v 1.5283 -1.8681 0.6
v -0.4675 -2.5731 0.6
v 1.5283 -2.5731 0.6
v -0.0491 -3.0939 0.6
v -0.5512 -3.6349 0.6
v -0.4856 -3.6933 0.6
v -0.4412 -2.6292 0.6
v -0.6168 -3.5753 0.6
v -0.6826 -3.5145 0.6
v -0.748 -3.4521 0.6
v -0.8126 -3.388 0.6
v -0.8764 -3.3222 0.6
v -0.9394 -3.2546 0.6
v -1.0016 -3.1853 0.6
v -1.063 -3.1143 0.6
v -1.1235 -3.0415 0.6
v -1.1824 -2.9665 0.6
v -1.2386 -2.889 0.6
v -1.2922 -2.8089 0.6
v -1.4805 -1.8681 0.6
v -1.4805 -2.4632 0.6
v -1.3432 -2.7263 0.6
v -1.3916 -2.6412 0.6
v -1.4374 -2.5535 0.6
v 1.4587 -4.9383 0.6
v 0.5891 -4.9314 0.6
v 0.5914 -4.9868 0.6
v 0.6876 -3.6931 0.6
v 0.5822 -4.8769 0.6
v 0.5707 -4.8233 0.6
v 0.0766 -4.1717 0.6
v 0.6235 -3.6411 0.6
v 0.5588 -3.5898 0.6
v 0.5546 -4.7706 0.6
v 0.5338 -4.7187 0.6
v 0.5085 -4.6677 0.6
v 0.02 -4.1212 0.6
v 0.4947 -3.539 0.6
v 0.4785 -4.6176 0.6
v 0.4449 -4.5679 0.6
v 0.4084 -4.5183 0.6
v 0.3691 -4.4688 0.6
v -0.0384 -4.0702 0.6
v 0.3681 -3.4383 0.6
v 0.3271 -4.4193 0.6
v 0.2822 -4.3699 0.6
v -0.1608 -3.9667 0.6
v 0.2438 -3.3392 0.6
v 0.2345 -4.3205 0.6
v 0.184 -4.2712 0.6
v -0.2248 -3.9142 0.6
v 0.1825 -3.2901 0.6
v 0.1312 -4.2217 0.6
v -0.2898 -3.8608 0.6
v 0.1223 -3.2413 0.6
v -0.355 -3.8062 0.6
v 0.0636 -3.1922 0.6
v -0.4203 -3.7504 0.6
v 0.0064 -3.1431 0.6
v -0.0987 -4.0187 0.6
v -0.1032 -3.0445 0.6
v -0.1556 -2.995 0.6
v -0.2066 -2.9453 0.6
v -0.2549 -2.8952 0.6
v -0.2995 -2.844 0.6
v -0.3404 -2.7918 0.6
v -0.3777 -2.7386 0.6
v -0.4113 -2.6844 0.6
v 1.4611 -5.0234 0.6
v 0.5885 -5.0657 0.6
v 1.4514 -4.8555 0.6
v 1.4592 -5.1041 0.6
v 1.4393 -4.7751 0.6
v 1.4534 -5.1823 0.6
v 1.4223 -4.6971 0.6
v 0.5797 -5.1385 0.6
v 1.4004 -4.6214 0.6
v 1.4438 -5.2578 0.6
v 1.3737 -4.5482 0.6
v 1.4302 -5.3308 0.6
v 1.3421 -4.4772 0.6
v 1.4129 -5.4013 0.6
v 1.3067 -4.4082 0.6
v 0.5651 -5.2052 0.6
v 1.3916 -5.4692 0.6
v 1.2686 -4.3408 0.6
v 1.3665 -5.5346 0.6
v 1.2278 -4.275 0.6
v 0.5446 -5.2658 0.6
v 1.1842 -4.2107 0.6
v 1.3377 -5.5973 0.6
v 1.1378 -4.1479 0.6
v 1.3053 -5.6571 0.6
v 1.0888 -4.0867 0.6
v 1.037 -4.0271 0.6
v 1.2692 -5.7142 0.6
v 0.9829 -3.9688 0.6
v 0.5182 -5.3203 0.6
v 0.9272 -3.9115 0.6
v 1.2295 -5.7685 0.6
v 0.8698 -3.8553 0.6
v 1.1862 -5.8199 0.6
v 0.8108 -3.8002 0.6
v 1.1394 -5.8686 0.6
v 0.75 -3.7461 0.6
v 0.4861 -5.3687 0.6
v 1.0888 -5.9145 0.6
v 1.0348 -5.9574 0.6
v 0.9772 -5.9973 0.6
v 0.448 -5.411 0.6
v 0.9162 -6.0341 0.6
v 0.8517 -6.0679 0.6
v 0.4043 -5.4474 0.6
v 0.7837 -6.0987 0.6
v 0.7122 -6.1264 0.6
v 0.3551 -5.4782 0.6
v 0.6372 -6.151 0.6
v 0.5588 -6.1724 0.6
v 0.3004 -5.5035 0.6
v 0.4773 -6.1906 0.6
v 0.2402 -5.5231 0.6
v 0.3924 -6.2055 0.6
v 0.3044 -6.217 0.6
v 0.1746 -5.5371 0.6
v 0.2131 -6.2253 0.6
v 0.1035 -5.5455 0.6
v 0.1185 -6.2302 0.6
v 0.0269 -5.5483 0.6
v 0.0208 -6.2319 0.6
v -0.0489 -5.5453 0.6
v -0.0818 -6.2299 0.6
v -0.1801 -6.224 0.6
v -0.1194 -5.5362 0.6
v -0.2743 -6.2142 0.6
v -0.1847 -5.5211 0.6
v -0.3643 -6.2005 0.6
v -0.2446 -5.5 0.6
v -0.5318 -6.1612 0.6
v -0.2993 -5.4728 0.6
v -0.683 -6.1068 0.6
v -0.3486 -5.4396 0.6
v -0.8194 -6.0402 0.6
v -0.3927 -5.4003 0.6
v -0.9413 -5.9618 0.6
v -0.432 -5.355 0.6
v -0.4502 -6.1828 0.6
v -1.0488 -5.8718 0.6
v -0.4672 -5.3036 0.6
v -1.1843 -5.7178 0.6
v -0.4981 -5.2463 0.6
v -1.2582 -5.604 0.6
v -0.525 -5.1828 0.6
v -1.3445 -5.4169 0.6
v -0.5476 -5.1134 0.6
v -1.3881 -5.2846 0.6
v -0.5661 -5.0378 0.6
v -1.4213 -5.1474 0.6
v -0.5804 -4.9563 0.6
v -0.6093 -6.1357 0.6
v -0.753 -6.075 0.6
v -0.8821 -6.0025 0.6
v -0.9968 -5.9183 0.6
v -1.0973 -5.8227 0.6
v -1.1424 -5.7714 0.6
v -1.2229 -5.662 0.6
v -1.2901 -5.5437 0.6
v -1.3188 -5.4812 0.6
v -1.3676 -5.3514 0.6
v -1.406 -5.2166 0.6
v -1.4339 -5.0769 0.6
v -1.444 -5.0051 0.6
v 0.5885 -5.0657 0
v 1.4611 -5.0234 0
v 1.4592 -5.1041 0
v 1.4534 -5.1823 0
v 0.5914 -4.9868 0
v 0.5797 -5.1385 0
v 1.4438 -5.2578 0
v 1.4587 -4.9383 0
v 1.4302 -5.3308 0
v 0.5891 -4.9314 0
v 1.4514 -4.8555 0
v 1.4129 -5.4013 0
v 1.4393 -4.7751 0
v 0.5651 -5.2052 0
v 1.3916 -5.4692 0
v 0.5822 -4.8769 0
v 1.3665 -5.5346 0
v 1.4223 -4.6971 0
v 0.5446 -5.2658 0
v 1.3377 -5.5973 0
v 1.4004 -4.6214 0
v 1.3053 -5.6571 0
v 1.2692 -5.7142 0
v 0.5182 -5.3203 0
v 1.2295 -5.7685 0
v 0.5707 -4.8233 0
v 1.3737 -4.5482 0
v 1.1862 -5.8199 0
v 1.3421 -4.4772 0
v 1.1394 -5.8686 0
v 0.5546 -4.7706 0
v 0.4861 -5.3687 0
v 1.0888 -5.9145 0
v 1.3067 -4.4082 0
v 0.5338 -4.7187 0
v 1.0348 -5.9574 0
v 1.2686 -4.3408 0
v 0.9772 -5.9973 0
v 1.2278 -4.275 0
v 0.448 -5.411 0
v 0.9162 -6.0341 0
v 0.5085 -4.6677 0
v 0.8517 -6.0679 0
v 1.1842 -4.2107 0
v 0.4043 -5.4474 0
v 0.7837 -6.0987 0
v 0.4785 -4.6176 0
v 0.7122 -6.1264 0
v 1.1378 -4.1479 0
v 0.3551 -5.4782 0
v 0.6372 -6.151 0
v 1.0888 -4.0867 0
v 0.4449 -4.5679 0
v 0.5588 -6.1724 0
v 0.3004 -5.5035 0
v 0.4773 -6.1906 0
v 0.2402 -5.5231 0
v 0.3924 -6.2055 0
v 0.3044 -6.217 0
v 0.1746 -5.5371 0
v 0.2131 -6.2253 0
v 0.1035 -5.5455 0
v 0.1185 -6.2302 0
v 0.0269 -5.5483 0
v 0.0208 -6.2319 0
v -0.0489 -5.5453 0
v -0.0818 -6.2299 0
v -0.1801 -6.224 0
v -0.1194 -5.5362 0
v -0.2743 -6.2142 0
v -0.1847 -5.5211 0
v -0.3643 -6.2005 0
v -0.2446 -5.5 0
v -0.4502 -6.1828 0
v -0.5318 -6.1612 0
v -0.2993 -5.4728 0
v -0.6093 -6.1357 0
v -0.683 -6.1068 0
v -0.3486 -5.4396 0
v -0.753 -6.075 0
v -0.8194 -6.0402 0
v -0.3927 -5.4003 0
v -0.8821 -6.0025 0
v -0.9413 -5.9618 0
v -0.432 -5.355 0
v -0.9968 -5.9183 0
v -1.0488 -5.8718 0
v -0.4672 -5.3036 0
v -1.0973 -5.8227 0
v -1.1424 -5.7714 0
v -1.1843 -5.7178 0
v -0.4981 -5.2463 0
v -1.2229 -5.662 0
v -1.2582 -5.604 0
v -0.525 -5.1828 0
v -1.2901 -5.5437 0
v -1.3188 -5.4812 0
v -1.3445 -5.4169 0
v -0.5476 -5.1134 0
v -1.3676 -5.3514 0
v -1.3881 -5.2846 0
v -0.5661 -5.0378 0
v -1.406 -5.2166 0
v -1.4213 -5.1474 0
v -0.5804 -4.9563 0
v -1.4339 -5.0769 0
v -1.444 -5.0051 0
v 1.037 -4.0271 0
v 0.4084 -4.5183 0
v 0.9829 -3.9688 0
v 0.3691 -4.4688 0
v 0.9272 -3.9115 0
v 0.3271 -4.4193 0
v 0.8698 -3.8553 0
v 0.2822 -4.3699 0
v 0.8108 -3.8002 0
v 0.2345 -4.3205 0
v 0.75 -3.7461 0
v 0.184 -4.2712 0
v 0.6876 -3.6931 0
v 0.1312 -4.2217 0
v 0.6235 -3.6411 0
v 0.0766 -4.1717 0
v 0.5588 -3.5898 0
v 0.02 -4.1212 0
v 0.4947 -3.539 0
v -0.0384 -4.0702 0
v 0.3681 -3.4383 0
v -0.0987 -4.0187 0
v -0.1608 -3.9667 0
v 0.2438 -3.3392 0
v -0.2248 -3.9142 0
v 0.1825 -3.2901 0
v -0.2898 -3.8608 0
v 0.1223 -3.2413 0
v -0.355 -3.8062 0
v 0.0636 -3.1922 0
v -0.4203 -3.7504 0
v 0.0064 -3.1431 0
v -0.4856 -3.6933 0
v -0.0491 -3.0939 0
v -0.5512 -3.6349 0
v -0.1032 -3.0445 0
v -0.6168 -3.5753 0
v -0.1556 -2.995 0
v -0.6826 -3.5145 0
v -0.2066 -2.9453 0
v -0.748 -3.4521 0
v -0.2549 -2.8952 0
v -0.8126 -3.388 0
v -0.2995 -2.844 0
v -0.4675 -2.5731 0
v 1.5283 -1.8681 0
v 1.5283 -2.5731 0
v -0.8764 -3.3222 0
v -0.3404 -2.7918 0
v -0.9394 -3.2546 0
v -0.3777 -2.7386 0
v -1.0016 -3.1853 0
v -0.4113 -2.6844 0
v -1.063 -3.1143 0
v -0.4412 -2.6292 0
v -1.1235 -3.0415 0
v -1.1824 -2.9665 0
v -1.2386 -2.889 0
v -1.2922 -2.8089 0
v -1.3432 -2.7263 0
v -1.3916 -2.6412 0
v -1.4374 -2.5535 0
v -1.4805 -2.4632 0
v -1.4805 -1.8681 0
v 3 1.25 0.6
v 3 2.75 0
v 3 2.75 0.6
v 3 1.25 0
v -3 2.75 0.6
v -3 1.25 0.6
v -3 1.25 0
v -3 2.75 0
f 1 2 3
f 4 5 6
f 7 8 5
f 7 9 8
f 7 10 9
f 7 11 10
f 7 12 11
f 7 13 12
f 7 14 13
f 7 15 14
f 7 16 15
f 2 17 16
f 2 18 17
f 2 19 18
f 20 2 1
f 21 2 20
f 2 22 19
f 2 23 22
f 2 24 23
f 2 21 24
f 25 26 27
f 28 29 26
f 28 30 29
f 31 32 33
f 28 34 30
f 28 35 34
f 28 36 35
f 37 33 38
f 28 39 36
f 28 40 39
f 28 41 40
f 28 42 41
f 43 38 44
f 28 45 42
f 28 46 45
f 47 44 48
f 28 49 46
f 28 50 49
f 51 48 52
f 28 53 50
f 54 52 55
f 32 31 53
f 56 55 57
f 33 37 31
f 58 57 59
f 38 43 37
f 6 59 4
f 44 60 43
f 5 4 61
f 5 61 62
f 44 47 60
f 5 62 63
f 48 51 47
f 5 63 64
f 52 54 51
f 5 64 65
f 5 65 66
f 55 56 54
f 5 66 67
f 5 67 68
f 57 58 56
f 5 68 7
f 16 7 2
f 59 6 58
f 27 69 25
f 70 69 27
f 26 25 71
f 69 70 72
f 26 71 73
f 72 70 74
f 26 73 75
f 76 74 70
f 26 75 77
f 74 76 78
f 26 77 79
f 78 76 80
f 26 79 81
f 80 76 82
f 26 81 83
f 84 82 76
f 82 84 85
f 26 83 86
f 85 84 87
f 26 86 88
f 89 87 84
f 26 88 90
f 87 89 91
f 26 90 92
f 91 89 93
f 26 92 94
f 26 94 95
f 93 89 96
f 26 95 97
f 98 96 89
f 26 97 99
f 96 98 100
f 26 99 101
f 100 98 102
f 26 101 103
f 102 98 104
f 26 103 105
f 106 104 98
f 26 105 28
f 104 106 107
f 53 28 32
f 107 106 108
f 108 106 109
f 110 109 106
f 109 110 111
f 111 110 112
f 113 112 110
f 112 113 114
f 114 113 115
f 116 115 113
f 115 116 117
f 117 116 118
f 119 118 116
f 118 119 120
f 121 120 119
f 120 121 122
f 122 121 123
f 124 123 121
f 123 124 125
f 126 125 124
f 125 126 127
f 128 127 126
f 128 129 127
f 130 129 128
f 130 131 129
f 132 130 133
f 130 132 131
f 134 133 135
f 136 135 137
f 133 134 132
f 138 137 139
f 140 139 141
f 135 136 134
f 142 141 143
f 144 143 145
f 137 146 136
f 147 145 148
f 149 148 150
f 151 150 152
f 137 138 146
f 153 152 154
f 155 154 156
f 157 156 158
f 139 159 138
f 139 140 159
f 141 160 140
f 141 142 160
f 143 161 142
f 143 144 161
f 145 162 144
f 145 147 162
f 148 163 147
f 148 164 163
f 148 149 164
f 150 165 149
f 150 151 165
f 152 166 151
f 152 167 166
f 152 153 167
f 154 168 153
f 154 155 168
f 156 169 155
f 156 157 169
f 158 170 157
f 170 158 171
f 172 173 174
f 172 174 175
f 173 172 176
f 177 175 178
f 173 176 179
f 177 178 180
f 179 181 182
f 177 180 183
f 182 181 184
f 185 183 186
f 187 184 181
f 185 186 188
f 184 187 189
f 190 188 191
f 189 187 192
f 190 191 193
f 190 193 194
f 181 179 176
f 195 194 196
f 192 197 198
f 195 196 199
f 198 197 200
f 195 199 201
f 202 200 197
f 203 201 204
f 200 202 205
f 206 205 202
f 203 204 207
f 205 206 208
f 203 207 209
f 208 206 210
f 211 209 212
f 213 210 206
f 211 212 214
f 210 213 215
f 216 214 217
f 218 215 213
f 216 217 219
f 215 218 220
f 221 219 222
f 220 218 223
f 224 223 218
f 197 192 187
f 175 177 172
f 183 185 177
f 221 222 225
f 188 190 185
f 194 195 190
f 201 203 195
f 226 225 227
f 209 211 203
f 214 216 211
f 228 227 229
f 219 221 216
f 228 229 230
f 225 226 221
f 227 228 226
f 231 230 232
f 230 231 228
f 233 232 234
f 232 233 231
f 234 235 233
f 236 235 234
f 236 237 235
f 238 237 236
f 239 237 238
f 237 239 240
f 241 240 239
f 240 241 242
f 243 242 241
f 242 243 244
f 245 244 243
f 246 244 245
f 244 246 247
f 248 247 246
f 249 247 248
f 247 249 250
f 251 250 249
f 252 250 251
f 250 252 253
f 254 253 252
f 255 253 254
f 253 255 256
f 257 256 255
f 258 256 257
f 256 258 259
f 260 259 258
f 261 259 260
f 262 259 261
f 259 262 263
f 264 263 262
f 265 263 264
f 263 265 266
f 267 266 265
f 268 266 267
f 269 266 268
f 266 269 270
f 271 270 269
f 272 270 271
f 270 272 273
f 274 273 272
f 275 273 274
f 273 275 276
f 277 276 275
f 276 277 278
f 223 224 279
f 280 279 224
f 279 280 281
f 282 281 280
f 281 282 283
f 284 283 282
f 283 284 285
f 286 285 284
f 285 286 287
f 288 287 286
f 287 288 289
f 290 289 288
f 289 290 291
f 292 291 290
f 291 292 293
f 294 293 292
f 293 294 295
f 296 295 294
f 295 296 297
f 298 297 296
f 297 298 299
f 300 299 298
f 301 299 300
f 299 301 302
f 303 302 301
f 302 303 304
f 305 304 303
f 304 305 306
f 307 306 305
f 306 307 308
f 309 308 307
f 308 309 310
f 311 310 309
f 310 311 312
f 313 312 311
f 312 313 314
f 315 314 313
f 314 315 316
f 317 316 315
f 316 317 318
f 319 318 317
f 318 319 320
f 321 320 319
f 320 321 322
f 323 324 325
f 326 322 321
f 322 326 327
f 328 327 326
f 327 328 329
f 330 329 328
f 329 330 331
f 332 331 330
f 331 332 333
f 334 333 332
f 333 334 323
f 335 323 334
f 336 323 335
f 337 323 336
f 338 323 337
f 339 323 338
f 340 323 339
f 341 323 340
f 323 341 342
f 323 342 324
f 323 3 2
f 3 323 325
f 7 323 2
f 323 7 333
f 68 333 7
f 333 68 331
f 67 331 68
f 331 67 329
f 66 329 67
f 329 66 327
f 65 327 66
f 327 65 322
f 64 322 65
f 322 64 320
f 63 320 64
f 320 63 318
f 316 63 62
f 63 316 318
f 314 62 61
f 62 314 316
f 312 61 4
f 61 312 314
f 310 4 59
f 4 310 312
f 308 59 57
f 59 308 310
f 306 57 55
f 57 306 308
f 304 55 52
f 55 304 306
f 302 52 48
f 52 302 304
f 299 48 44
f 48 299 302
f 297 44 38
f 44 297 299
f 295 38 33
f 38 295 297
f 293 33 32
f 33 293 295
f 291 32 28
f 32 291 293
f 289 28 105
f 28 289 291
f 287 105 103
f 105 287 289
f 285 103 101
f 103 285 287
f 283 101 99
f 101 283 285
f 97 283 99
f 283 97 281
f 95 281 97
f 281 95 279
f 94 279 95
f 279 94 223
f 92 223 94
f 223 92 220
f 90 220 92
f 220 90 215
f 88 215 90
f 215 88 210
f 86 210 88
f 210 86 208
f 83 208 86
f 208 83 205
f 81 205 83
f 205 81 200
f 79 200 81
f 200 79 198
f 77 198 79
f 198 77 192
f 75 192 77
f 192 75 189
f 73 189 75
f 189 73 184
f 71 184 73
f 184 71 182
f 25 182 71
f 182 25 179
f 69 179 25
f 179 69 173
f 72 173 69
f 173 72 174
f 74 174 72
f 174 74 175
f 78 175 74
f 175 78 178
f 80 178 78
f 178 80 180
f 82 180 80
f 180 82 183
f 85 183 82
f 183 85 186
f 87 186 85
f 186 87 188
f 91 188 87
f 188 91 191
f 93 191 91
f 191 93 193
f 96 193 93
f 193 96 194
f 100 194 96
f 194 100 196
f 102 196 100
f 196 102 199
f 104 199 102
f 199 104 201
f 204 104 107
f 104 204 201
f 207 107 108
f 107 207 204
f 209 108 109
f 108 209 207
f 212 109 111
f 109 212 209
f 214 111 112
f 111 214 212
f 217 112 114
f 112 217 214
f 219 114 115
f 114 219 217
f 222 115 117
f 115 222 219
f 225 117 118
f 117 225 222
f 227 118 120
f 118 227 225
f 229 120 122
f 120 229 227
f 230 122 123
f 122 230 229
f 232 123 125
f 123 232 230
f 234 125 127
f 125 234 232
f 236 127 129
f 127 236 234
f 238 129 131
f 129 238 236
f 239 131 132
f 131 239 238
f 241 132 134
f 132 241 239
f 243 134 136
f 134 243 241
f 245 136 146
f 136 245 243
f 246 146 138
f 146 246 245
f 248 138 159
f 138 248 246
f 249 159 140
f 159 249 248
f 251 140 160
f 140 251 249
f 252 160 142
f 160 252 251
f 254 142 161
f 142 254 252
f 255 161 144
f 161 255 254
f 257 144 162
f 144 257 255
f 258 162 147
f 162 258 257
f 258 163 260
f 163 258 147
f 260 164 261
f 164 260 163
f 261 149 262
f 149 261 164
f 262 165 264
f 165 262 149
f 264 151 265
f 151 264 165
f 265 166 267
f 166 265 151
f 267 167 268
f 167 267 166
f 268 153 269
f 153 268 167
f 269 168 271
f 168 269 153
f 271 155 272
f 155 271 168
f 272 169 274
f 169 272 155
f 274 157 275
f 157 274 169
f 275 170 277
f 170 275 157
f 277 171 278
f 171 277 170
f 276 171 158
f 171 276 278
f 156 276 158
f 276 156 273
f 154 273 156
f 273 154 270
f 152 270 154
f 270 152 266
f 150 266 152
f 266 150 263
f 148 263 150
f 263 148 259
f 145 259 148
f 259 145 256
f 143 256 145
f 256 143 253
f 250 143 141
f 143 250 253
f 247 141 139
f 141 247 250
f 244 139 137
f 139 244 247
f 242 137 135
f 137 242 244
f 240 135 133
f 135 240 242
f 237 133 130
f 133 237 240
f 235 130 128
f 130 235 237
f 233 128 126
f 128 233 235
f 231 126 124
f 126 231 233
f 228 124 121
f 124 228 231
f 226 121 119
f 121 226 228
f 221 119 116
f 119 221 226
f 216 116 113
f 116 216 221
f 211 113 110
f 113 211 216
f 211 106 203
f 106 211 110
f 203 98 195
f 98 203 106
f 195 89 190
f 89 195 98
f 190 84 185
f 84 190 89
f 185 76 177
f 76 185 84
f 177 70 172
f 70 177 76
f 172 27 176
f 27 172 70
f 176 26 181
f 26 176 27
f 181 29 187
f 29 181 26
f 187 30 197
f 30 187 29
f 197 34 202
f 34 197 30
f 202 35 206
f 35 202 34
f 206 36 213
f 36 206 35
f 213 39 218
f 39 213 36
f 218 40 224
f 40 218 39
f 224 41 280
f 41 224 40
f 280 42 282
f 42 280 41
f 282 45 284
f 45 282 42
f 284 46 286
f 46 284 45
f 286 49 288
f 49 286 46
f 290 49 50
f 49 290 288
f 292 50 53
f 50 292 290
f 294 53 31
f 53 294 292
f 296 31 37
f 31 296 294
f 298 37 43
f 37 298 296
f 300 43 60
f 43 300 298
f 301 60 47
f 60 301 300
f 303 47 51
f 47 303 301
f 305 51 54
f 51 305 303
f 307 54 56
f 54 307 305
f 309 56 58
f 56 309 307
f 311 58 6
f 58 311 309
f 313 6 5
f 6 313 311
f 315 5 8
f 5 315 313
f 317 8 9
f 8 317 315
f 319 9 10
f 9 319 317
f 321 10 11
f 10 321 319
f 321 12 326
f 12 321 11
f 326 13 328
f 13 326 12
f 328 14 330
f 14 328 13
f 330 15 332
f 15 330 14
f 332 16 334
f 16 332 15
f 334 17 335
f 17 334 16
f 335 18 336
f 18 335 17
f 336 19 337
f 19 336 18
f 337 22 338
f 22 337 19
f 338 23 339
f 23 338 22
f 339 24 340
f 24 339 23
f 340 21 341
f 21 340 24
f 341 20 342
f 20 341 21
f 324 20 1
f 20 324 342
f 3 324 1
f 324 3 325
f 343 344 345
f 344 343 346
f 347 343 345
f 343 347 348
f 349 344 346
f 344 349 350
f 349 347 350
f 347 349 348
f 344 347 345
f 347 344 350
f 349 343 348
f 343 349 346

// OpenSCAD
$fn = 50;

difference() {
	union() {
		translate(v = [0.0, -4.0, 0.6]) {
			rotate(a = [180, 0, 0]) {
				linear_extrude(height = 0.6) {
					text(font = "Liberation Sans:style=Bold", halign = "center", size = 4.5, text = "2", valign = "center");
				}
			}
		}
		translate(v = [-3.0, 1.25, 0]) {
			cube(size = [6, 1.5, 0.6]);
		}
	}
	union();
}
